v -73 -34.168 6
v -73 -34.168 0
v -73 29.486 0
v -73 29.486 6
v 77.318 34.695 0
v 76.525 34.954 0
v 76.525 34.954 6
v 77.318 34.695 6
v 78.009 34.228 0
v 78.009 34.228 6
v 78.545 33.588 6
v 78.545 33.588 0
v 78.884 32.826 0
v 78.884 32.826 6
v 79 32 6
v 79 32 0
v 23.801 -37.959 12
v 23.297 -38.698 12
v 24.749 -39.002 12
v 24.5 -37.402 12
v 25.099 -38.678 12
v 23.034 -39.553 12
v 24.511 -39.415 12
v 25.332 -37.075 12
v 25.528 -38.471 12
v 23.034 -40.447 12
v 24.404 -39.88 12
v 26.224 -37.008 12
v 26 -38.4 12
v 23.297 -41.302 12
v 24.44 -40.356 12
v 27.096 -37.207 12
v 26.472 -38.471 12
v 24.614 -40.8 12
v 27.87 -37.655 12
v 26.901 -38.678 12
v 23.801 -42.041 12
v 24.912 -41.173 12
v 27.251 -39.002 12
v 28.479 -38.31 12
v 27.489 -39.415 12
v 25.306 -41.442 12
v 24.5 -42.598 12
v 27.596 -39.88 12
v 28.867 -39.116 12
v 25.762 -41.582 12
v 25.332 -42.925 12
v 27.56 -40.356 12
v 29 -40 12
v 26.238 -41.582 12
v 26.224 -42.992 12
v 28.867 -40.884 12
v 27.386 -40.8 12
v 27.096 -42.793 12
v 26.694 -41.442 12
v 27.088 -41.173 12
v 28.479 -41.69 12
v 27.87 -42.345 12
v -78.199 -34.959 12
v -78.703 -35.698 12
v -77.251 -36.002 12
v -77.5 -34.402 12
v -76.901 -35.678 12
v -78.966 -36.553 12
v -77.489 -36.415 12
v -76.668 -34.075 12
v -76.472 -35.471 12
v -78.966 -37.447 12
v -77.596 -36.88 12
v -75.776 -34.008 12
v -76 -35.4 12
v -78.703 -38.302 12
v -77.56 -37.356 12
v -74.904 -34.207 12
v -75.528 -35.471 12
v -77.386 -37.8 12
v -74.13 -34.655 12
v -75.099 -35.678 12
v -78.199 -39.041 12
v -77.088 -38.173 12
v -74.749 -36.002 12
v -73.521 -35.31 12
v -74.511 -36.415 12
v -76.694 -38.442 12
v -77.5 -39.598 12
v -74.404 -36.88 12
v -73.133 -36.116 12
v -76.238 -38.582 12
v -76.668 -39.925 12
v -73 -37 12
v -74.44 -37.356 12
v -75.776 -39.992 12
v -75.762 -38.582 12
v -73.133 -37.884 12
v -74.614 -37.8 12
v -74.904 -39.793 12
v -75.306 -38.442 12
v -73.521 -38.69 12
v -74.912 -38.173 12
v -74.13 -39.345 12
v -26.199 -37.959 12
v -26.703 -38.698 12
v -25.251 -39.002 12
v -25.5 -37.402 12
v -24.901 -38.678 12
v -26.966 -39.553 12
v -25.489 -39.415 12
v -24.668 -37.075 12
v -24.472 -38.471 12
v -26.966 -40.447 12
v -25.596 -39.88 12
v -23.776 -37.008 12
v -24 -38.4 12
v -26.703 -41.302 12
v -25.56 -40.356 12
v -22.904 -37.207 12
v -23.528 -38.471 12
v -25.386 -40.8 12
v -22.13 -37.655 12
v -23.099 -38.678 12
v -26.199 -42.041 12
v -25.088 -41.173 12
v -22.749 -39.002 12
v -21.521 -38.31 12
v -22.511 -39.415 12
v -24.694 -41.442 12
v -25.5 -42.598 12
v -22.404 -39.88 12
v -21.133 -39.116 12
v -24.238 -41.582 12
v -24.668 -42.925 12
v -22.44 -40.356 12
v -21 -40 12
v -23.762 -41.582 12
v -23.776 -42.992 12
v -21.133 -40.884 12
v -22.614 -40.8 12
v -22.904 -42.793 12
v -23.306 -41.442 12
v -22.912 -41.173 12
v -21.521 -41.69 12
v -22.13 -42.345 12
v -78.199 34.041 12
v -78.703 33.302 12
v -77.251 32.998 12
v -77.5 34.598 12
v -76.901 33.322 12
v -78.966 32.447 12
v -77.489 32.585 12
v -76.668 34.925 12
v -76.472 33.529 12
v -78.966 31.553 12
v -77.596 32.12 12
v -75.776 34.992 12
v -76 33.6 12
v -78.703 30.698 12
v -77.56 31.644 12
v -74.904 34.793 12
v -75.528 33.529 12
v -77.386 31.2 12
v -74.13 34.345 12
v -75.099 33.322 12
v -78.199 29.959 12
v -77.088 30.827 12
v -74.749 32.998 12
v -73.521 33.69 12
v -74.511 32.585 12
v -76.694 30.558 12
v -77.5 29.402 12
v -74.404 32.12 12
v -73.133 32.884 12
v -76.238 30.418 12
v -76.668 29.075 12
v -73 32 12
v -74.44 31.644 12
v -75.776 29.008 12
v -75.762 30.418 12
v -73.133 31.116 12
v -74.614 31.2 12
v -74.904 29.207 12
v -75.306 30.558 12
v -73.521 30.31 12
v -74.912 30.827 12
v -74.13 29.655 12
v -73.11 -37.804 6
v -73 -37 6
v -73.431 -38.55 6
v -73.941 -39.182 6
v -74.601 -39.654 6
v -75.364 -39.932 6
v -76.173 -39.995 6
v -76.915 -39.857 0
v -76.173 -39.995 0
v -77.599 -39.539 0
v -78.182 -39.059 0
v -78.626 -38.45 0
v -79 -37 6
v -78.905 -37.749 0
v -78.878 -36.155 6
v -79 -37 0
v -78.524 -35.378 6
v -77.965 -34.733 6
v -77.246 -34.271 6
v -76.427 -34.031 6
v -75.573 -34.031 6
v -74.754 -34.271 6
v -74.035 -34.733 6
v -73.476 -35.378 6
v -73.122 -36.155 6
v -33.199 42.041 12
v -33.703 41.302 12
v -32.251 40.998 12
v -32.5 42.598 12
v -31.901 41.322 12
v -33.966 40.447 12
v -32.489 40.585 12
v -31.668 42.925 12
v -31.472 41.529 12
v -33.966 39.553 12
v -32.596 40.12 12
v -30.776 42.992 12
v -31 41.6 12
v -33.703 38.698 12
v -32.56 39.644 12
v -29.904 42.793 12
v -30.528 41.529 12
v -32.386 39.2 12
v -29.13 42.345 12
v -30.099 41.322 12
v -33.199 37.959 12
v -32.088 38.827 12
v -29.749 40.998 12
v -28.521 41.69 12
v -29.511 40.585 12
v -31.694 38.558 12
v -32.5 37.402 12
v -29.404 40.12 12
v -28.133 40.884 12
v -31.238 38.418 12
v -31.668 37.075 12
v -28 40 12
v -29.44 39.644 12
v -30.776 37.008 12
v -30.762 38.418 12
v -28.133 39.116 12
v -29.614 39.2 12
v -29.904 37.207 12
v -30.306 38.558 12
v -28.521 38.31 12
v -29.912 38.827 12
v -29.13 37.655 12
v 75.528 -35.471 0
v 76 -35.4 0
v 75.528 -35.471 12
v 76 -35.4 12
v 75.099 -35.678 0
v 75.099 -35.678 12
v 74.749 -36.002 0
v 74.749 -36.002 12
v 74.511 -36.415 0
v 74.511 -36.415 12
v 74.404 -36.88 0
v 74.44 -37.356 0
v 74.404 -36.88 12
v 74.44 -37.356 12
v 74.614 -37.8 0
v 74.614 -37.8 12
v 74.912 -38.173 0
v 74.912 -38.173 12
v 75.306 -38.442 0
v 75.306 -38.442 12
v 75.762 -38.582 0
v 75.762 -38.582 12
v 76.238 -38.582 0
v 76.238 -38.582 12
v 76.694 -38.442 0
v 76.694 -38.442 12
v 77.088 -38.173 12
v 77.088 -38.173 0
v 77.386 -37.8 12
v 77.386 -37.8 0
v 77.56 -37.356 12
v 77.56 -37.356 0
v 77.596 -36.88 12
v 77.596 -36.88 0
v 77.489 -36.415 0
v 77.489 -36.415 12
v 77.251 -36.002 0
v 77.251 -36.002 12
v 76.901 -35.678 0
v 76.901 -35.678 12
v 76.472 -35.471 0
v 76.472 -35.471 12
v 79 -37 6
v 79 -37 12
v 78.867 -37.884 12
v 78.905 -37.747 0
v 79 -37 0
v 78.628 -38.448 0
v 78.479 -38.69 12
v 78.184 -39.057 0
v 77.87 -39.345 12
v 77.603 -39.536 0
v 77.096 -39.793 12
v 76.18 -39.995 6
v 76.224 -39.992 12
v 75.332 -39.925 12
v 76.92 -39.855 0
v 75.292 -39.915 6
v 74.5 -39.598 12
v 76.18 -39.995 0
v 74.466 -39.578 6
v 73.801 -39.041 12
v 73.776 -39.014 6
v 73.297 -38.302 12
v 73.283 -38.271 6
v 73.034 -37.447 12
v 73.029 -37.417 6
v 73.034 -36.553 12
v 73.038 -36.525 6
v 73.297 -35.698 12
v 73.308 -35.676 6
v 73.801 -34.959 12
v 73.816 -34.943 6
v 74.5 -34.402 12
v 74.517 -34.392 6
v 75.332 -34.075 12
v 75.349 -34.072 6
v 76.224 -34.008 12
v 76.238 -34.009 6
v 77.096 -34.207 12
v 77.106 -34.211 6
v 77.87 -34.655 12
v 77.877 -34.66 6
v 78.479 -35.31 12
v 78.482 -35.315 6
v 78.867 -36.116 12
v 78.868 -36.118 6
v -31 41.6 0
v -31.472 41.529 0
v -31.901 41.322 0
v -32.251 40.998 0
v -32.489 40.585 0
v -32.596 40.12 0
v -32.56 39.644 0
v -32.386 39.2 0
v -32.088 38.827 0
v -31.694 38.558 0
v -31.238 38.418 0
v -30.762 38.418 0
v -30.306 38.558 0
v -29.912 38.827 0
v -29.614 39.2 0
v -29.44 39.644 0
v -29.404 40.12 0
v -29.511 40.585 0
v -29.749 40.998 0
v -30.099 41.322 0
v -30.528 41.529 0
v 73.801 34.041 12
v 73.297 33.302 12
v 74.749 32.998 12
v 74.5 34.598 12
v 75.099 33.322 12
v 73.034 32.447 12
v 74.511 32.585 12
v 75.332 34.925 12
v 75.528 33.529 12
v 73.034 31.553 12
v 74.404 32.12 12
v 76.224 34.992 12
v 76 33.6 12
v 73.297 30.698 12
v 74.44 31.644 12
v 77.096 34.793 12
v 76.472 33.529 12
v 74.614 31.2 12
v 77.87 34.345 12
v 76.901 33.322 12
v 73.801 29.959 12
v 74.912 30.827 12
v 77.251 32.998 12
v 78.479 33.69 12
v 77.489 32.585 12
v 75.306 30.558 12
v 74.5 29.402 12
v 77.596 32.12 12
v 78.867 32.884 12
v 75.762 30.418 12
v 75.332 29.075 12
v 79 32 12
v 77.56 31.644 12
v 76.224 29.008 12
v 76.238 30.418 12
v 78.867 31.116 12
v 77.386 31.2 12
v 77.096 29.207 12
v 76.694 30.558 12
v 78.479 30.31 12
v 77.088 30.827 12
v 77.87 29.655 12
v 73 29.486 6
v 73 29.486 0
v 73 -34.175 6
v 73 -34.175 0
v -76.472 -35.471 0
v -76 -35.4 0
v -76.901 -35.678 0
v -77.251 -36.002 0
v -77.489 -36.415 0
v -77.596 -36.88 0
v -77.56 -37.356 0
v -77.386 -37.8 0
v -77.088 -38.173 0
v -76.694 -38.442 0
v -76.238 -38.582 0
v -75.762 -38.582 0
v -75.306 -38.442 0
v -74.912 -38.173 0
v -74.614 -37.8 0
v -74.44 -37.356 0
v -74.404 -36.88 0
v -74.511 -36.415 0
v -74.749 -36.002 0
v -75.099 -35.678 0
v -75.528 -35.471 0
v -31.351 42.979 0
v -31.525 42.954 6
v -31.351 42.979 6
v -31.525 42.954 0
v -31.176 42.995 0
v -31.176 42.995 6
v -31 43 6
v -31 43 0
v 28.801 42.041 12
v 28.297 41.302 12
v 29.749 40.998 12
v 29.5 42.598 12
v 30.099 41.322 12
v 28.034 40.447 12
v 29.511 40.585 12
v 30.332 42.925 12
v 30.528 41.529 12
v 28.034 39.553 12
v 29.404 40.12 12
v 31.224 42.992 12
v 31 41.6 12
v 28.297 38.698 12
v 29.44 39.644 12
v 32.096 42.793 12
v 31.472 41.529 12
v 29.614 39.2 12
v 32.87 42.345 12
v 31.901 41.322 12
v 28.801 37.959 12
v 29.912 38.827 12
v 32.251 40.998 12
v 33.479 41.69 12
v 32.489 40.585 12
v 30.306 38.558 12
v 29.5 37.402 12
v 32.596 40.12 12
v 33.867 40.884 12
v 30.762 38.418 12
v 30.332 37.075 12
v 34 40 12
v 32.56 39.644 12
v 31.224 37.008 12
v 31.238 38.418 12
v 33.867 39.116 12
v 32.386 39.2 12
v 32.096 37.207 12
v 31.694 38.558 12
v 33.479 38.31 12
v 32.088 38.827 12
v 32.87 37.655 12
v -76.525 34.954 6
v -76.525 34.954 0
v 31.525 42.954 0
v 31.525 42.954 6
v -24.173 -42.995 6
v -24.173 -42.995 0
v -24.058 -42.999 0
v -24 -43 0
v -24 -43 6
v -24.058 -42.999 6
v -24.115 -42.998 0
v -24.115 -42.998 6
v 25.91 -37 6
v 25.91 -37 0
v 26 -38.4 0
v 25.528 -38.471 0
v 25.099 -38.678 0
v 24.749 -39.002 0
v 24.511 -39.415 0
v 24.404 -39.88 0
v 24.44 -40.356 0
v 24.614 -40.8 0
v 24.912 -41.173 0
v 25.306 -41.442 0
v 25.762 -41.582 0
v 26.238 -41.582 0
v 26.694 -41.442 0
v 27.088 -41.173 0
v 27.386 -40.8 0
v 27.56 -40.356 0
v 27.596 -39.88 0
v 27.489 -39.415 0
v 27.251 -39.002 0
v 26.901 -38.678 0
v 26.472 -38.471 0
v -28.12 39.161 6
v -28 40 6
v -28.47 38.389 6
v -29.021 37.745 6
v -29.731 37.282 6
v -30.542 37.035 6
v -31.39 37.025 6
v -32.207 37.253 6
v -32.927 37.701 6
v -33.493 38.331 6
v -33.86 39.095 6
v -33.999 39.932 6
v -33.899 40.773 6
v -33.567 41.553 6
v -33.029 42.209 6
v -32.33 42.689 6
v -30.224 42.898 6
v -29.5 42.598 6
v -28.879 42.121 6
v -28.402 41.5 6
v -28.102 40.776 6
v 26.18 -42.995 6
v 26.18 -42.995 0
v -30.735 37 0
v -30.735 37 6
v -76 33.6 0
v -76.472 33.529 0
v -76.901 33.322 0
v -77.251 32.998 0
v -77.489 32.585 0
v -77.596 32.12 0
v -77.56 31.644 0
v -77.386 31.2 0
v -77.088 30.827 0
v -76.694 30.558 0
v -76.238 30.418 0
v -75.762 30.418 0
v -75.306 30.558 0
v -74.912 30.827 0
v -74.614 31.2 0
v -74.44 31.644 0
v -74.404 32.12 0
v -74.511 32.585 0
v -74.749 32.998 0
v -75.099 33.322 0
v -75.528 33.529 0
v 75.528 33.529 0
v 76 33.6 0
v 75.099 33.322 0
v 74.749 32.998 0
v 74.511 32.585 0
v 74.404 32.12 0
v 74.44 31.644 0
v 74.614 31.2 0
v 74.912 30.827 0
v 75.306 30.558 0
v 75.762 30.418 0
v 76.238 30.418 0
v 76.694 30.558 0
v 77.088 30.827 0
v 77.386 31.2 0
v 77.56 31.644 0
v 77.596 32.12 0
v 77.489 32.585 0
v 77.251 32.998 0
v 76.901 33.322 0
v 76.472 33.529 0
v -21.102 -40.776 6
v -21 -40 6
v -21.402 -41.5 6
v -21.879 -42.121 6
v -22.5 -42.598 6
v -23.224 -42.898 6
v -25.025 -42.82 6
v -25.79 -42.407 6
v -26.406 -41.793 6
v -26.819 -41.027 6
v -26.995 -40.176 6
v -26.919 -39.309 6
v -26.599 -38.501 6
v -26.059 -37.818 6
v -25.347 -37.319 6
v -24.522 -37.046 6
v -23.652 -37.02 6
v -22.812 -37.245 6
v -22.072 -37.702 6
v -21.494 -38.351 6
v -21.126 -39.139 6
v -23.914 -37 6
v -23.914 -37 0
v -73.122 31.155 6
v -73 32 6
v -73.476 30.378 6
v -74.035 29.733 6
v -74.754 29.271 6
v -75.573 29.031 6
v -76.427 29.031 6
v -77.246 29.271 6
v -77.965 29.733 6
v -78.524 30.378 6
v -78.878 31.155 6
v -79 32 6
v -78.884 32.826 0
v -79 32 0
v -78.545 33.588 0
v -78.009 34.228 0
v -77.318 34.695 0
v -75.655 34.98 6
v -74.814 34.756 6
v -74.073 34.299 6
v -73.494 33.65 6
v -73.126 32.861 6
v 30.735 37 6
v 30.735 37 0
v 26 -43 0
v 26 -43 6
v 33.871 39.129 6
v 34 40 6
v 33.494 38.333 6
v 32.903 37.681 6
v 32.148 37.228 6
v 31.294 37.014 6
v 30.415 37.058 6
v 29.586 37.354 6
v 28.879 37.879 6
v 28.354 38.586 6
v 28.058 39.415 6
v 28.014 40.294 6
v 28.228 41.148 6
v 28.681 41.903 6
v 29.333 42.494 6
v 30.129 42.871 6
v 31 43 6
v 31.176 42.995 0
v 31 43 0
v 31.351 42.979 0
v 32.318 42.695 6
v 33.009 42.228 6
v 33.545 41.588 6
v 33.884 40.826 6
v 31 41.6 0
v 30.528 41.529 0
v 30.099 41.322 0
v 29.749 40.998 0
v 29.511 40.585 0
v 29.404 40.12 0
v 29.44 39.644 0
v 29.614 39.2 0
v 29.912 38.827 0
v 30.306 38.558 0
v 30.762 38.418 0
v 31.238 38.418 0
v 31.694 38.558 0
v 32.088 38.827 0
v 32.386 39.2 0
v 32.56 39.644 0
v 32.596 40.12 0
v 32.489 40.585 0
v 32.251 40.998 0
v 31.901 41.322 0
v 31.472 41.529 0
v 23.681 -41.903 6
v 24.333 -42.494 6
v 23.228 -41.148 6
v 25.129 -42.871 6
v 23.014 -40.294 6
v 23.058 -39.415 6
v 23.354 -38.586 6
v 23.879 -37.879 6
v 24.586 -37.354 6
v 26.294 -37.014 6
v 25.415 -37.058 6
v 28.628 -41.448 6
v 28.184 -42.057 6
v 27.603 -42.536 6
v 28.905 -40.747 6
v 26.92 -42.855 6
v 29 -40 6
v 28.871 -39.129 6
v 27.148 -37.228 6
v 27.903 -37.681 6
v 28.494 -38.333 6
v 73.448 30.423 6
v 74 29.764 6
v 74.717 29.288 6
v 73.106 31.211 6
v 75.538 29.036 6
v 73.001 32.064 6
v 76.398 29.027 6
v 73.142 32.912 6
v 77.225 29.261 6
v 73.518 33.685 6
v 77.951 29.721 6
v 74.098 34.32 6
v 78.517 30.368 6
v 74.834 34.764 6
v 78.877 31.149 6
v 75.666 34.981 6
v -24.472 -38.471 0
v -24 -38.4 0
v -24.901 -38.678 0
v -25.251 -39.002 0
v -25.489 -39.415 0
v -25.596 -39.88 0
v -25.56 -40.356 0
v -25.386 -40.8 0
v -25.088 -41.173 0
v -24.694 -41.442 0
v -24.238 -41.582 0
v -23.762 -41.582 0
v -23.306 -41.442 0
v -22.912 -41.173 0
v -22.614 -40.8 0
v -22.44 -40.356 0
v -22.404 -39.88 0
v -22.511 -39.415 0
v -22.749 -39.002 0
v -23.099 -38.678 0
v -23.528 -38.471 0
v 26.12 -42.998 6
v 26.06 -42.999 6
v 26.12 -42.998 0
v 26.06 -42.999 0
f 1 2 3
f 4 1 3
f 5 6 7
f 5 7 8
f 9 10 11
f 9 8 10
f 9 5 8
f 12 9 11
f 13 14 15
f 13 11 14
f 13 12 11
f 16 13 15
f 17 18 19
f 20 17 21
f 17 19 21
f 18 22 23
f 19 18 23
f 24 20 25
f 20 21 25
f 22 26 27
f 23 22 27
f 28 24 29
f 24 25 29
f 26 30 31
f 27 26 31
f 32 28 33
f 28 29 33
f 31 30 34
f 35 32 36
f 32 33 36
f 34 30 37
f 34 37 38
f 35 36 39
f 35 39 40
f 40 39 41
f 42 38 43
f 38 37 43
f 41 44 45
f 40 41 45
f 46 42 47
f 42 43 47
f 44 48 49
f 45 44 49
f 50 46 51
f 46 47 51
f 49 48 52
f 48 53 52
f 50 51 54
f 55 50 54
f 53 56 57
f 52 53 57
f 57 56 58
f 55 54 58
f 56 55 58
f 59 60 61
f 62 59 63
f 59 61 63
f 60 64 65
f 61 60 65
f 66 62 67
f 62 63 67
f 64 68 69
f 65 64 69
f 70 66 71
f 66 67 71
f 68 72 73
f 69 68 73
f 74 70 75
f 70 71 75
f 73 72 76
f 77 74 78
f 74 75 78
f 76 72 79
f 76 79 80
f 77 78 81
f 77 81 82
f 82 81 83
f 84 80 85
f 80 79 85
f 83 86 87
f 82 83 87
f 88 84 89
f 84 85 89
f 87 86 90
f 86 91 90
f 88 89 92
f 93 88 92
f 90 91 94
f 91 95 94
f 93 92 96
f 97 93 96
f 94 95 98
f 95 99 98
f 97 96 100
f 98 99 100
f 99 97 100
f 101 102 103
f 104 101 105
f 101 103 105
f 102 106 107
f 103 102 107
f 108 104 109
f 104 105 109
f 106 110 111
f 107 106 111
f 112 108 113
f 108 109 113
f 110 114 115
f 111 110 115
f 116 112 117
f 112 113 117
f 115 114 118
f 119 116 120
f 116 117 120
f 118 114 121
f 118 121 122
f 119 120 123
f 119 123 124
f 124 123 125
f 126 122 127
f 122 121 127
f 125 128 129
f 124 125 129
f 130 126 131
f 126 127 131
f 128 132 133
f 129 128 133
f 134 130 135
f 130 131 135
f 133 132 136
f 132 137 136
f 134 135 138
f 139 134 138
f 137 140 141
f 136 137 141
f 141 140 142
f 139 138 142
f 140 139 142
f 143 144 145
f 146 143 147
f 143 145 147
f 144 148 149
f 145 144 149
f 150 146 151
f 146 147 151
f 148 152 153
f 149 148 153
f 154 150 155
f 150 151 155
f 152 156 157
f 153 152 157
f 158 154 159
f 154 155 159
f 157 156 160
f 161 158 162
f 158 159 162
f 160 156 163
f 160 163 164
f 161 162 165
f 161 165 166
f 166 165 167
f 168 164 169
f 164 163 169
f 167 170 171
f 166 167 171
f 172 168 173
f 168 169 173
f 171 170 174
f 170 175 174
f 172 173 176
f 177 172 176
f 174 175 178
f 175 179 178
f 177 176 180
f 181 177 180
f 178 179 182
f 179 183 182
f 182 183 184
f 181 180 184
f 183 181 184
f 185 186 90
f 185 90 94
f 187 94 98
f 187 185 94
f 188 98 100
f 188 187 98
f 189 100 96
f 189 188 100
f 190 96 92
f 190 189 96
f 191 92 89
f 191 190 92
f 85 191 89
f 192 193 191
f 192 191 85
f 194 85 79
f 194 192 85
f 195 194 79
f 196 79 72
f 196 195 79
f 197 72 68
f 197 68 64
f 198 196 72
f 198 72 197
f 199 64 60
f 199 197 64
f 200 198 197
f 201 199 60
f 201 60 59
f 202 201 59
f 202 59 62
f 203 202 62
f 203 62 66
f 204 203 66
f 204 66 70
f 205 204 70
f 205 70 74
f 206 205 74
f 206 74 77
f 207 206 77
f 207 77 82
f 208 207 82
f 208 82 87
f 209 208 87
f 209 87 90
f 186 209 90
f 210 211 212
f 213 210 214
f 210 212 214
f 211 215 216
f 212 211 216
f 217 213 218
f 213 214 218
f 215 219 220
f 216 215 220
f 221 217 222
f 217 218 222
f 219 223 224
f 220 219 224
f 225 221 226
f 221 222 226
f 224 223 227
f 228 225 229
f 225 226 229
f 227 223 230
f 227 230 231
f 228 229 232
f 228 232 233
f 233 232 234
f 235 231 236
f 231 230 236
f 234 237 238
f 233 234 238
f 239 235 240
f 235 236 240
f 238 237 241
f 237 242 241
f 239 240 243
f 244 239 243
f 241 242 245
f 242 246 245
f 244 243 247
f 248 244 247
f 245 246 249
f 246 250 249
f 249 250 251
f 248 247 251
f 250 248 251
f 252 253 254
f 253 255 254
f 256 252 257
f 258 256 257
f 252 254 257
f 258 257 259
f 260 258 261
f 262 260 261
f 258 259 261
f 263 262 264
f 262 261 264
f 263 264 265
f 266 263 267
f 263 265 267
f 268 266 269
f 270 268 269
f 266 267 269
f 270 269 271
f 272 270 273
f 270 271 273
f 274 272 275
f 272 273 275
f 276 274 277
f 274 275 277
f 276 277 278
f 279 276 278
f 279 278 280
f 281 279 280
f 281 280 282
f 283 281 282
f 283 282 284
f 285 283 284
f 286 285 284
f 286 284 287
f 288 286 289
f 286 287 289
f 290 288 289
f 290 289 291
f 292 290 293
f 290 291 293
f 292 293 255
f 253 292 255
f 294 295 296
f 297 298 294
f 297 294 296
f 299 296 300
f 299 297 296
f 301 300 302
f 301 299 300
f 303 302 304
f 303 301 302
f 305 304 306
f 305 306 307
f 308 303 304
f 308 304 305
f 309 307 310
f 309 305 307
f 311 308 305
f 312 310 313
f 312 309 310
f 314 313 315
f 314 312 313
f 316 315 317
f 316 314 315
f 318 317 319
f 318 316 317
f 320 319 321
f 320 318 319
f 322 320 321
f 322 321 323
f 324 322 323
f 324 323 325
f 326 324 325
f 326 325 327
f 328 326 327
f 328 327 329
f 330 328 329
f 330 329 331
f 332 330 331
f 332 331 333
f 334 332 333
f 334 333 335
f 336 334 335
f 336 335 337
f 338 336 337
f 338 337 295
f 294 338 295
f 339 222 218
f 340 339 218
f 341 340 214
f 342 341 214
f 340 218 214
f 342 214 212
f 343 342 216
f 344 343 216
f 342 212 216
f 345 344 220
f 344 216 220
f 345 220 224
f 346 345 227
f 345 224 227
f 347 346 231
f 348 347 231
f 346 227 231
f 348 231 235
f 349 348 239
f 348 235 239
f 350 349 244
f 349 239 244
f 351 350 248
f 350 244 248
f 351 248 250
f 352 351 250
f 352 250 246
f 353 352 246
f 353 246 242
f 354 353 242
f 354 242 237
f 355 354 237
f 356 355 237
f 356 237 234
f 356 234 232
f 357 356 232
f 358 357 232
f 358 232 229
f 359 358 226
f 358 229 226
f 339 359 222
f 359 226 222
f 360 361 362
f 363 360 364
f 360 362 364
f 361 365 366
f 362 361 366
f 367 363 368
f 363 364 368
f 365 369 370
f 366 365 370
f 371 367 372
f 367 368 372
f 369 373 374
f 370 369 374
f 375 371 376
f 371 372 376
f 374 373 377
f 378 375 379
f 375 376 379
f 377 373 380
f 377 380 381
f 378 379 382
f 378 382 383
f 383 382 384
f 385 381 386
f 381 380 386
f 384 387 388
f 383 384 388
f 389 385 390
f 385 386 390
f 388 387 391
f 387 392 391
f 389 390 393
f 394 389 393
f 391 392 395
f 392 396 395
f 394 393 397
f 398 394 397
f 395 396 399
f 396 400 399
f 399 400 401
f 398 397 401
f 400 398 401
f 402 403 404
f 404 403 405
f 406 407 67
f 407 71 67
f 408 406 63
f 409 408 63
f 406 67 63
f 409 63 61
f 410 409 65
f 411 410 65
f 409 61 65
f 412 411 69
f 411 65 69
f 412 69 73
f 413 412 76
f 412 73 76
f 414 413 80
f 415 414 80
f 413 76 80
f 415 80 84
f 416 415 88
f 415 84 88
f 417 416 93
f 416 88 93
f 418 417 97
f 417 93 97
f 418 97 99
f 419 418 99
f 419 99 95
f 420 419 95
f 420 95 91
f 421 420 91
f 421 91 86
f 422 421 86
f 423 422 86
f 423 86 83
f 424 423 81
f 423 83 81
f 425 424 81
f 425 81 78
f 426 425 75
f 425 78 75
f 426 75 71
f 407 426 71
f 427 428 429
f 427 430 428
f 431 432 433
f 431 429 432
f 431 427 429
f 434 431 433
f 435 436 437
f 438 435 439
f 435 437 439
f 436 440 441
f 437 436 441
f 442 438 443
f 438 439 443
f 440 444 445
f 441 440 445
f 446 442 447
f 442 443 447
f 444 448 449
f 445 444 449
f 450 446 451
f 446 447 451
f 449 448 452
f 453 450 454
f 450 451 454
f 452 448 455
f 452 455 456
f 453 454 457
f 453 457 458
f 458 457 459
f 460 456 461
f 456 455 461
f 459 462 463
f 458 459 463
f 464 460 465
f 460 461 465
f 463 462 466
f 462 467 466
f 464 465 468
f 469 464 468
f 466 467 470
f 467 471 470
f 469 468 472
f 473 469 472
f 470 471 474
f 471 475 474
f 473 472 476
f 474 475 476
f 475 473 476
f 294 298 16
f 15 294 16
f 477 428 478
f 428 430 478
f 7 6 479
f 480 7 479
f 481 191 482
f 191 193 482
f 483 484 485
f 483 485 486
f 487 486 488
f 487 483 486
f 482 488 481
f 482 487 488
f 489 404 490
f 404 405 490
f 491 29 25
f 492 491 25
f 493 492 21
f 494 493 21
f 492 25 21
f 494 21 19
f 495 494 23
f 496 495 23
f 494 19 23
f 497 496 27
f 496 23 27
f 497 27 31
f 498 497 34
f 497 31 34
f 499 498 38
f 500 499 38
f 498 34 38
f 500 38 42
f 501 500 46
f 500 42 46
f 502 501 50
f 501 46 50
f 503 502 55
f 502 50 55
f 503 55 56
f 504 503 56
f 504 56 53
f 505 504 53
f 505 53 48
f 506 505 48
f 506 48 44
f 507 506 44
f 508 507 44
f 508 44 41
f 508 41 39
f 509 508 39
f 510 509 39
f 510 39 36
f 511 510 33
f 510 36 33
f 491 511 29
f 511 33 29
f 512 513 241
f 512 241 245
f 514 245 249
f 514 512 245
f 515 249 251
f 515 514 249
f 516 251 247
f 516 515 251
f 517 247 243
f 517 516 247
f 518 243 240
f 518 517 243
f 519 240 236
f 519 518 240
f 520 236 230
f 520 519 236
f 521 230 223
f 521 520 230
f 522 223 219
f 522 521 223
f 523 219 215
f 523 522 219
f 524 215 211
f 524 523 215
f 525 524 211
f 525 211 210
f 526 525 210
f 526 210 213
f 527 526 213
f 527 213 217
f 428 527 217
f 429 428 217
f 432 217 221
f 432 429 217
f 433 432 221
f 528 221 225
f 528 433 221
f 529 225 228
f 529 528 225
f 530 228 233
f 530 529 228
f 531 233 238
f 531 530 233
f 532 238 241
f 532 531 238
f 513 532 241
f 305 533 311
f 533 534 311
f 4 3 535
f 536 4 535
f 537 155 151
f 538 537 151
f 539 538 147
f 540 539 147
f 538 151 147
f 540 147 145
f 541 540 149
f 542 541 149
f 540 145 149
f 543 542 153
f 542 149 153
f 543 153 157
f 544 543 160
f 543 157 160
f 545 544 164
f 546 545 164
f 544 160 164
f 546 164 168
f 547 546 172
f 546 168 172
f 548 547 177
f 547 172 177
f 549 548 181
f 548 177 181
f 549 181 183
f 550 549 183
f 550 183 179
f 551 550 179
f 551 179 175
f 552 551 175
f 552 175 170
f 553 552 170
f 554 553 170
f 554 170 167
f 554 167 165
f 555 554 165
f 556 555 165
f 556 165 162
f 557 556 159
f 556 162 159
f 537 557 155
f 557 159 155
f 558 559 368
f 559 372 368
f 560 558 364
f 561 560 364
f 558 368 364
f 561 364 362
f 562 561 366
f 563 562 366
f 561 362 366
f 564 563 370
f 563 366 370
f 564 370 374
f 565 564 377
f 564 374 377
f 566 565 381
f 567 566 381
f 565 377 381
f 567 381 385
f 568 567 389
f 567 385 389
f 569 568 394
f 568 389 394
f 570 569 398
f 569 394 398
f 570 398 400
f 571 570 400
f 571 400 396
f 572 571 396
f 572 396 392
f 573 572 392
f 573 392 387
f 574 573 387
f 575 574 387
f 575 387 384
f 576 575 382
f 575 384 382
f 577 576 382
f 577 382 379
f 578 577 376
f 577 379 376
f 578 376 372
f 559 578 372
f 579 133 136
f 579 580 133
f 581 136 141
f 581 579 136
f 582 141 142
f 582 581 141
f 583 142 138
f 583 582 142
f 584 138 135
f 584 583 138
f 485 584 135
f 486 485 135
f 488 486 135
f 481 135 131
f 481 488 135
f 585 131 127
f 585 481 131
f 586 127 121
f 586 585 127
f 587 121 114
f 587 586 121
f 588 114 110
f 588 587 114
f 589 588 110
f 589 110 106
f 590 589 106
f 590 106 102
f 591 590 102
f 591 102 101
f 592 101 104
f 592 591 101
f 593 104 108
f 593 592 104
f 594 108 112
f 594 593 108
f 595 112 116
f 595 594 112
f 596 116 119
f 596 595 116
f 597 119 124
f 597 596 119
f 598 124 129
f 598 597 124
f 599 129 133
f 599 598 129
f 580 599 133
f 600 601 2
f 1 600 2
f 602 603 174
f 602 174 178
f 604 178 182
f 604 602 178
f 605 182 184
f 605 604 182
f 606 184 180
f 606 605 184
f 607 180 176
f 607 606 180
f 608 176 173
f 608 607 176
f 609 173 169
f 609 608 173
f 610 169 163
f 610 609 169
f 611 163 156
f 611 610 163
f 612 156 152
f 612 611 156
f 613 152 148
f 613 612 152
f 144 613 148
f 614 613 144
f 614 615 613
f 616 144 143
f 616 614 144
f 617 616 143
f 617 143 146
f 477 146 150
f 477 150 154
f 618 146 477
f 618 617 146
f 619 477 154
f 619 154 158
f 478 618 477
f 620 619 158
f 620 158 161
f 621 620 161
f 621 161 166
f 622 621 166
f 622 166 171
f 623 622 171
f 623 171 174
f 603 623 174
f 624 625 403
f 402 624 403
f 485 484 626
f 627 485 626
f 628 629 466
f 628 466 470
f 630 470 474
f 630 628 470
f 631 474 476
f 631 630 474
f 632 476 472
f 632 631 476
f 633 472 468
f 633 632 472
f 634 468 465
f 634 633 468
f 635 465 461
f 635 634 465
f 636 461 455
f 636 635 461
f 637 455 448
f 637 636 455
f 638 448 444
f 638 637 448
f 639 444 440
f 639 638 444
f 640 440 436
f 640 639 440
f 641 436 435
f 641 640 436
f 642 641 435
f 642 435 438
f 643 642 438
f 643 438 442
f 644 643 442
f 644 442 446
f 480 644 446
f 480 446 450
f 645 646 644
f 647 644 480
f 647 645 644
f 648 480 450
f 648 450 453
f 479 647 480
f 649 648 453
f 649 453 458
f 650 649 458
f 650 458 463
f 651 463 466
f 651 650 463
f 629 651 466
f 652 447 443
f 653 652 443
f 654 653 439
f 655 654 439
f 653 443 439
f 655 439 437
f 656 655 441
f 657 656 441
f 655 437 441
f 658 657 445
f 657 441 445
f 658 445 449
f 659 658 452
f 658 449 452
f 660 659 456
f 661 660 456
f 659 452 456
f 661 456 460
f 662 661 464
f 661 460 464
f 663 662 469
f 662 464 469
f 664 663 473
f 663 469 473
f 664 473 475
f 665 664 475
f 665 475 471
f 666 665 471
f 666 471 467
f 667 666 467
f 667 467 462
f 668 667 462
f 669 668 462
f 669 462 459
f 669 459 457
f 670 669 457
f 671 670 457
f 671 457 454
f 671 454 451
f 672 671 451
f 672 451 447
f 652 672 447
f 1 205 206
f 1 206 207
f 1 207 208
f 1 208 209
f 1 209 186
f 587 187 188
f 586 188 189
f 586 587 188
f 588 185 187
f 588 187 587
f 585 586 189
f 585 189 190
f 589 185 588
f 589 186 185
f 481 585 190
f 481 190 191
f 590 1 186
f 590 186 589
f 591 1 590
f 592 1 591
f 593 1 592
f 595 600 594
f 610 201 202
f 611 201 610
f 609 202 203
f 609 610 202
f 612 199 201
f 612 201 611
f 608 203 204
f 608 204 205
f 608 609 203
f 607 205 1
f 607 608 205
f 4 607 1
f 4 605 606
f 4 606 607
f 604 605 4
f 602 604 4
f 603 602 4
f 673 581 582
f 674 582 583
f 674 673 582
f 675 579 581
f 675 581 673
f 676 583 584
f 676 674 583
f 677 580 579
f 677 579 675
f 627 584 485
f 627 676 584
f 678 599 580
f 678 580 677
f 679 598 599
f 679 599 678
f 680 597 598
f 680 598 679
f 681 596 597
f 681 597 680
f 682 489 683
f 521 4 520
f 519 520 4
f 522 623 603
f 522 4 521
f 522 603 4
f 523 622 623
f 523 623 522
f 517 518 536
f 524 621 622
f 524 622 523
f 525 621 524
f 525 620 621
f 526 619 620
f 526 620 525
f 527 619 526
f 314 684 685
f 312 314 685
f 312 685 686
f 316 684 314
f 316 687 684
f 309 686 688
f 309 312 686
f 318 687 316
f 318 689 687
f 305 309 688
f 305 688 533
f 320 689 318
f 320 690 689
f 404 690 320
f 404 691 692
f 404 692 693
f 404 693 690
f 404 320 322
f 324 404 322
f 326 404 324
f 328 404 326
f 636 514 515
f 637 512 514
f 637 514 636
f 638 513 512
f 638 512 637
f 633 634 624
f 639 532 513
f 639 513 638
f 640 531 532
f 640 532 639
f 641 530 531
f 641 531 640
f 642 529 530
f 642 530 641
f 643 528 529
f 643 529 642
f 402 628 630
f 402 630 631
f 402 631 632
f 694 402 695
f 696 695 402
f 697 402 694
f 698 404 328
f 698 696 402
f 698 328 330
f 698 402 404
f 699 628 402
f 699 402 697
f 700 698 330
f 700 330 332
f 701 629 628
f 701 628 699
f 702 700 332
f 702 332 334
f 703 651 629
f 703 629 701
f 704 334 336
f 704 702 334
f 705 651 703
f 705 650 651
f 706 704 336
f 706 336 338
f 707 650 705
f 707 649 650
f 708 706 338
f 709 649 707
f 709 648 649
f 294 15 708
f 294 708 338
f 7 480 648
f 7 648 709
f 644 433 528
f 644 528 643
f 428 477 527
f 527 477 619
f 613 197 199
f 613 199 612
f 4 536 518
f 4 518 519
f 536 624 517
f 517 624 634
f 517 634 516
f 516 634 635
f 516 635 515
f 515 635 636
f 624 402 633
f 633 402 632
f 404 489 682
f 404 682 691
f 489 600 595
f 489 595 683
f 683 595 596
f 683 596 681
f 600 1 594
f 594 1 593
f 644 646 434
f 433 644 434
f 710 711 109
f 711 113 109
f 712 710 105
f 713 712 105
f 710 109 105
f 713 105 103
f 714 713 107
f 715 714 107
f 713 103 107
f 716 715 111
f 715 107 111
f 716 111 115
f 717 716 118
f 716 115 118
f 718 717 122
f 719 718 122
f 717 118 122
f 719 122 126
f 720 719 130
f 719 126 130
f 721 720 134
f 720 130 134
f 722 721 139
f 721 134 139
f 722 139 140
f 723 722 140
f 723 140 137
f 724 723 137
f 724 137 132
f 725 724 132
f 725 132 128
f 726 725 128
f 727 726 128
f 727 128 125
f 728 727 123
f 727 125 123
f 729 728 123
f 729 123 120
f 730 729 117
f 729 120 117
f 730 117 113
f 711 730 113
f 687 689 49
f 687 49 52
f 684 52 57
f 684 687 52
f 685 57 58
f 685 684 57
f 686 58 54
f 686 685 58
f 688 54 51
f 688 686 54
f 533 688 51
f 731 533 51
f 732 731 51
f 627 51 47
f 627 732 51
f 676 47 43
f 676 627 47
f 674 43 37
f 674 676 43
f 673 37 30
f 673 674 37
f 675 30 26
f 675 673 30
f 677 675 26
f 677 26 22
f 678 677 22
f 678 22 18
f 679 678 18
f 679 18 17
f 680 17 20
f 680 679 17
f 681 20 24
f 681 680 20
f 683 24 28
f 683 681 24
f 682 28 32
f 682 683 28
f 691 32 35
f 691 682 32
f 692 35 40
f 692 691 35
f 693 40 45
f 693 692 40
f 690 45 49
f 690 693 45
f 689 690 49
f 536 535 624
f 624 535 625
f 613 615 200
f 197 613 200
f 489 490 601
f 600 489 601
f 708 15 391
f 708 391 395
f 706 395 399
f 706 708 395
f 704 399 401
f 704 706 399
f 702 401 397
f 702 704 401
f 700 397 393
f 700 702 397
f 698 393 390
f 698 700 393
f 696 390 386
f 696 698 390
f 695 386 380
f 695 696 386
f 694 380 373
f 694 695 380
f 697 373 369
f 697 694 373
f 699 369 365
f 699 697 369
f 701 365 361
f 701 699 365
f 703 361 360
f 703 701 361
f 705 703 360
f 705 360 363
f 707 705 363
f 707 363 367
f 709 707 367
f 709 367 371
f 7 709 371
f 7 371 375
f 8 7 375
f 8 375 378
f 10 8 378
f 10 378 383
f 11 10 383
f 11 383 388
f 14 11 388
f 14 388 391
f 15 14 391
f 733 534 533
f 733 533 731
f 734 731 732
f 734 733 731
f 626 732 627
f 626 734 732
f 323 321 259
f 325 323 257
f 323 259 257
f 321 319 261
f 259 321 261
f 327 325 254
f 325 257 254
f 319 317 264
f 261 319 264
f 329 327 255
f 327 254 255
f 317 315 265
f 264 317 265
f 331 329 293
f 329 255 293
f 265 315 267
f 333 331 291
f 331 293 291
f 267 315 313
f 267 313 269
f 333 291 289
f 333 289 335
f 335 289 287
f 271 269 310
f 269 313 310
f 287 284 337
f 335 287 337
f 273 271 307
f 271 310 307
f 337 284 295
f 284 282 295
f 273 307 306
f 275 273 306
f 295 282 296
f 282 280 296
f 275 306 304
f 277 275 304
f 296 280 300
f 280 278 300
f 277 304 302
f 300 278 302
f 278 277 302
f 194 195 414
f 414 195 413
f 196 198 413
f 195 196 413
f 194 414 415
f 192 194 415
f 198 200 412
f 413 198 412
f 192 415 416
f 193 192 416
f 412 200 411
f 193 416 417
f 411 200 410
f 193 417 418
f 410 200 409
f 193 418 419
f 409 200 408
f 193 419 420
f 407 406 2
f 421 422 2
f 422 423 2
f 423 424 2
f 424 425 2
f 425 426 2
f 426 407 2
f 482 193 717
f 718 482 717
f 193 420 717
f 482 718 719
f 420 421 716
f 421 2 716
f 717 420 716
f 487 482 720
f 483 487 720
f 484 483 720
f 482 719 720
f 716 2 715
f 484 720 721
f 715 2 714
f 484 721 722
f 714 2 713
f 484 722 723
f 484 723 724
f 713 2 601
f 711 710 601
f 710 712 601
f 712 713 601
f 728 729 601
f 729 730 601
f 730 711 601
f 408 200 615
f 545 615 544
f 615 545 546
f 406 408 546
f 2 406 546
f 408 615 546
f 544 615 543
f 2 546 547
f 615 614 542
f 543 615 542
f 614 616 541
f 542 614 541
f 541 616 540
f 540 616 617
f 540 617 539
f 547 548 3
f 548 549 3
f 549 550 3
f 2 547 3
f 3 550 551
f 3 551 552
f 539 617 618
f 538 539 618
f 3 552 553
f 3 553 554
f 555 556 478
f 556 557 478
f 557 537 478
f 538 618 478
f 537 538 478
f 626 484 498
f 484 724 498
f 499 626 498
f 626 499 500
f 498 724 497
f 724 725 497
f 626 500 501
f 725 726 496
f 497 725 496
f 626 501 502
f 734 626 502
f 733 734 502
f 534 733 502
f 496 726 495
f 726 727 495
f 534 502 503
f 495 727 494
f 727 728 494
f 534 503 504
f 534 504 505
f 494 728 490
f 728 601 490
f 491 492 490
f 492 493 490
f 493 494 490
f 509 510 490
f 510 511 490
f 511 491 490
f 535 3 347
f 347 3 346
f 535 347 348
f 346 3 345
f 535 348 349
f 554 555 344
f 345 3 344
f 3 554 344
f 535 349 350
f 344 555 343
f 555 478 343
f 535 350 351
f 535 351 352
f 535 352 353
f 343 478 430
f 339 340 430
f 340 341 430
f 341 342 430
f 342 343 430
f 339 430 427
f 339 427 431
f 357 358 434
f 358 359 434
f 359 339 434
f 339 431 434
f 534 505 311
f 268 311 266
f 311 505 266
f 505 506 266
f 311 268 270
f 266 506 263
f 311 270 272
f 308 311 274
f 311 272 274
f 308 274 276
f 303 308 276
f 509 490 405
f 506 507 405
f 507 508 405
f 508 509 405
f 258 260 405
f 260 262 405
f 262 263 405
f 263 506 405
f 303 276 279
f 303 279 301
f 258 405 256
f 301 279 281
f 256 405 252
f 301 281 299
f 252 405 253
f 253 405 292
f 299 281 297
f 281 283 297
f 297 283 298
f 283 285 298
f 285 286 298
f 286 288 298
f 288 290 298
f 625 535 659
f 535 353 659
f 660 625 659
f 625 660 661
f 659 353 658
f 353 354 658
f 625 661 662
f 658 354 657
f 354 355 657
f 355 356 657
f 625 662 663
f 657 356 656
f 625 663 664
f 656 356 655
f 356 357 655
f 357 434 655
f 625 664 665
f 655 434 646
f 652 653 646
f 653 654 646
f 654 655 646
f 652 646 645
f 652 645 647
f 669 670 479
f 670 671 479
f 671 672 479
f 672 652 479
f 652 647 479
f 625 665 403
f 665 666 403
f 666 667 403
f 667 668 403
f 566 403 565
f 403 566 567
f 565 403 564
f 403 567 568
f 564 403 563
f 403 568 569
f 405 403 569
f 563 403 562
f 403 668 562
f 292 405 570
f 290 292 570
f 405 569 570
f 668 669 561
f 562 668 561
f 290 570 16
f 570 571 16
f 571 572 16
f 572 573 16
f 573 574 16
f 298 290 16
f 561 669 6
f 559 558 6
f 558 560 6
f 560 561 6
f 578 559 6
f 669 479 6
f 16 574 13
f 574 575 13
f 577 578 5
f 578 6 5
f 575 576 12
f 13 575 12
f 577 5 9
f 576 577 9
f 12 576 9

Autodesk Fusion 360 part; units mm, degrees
sketch "Sketch1" plane through (0, 0, 0) normal (0, 0, 1) x (1, 0, 0)
  circle A0 centre (-76, 32) radius 1.6
  circle A1 centre (-31, 40) radius 1.6
  circle A2 centre (31, 40) radius 1.6
  circle A3 centre (76, 32) radius 1.6
  circle A4 centre (-76, -37) radius 1.6
  circle A5 centre (-24, -40) radius 1.6
  circle A6 centre (26, -40) radius 1.6
  circle A7 centre (76, -37) radius 1.6
  line L0 (-80, 44) -> (80, 44)
  line L1 (80, 44) -> (80, -44)
  line L2 (80, -44) -> (-80, -44)
  line L3 (-80, -44) -> (-80, 44)
  line L4 (80, 44) -> (-80, -44) construction
  dimension "d1" = 3.2
  dimension "d2" = 69
  dimension "d3" = 152
  dimension "d4" = 50
  dimension "d5" = 62
  dimension "d6" = 7
  dimension "d7" = 160
  dimension "d8" = 4
  dimension "d9" = 88
  dimension "d10" = 4
  dimension "d11" = 4
  dimension "d13" = 49
  dimension "d21" = 56
sketch "Sketch2" plane through (0, 0, 0) normal (0, 0, 1) x (1, 0, 0)
  circle A0 centre (-76, 32) radius 1.6 construction
  circle A1 centre (-31, 40) radius 1.6 construction
  circle A2 centre (31, 40) radius 1.6 construction
  circle A3 centre (76, 32) radius 1.6 construction
  circle A4 centre (76, -37) radius 1.6 construction
  circle A5 centre (26, -40) radius 1.6 construction
  circle A6 centre (-24, -40) radius 1.6 construction
  circle A7 centre (-76, -37) radius 1.6 construction
  circle A8 centre (-76, 32) radius 3 construction
  circle A9 centre (-31, 40) radius 3 construction
  circle A10 centre (31, 40) radius 3 construction
  circle A11 centre (76, 32) radius 3 construction
  circle A12 centre (76, -37) radius 3 construction
  circle A13 centre (26, -40) radius 3 construction
  circle A14 centre (-24, -40) radius 3 construction
  circle A15 centre (-76, -37) radius 3 construction
  line L0 (-79, 32) -> (-79, -37)
  arc A16 (-79, -37) -> (-73, -37) centre (-76, -37) ccw
  line L1 (-73, -37) -> (-73, 32)
  arc A17 (-73, 32) -> (-79, 32) centre (-76, 32) ccw
  line L2 (-76, 32) -> (-76, -37) construction
  line L3 (-76.1728, -39.995) -> (-24.1728, -42.995)
  arc A18 (-24.1728, -42.995) -> (-23.8272, -37.005) centre (-24, -40) ccw
  line L4 (-23.8272, -37.005) -> (-75.8272, -34.005)
  arc A19 (-75.8272, -34.005) -> (-76.1728, -39.995) centre (-76, -37) ccw
  line L5 (-76, -37) -> (-24, -40) construction
  line L6 (-75.4749, 29.0463) -> (-30.4749, 37.0463)
  arc A20 (-30.4749, 37.0463) -> (-31.5251, 42.9537) centre (-31, 40) ccw
  line L7 (-31.5251, 42.9537) -> (-76.5251, 34.9537)
  arc A21 (-76.5251, 34.9537) -> (-75.4749, 29.0463) centre (-76, 32) ccw
  line L8 (-76, 32) -> (-31, 40) construction
  line L9 (-31, 37) -> (31, 37)
  arc A22 (31, 37) -> (31, 43) centre (31, 40) ccw
  line L10 (31, 43) -> (-31, 43)
  arc A23 (-31, 43) -> (-31, 37) centre (-31, 40) ccw
  line L11 (-31, 40) -> (31, 40) construction
  line L12 (30.4749, 37.0463) -> (75.4749, 29.0463)
  arc A24 (75.4749, 29.0463) -> (76.5251, 34.9537) centre (76, 32) ccw
  line L13 (76.5251, 34.9537) -> (31.5251, 42.9537)
  arc A25 (31.5251, 42.9537) -> (30.4749, 37.0463) centre (31, 40) ccw
  line L14 (31, 40) -> (76, 32) construction
  line L15 (73, 32) -> (73, -37)
  arc A26 (73, -37) -> (79, -37) centre (76, -37) ccw
  line L16 (79, -37) -> (79, 32)
  arc A27 (79, 32) -> (73, 32) centre (76, 32) ccw
  line L17 (76, 32) -> (76, -37) construction
  line L18 (75.8203, -34.0054) -> (25.8203, -37.0054)
  arc A28 (25.8203, -37.0054) -> (26.1797, -42.9946) centre (26, -40) ccw
  line L19 (26.1797, -42.9946) -> (76.1797, -39.9946)
  arc A29 (76.1797, -39.9946) -> (75.8203, -34.0054) centre (76, -37) ccw
  line L20 (76, -37) -> (26, -40) construction
  line L21 (26, -37) -> (-24, -37)
  arc A30 (-24, -37) -> (-24, -43) centre (-24, -40) ccw
  line L22 (-24, -43) -> (26, -43)
  arc A31 (26, -43) -> (26, -37) centre (26, -40) ccw
  line L23 (26, -40) -> (-24, -40) construction
  dimension "d14" = 6
extrude "Extrude1" add sketch "Sketch2" along normal blind 6 contours L0 L1 L4 A19 L6 A21 | L1 A17 L6 A21 | A16 L1 L4 A19 | L1 A17 L6 L7 L9 A23 | A16 L1 L3 L4 L21 A30 | L6 A20 L9 A23 | A18 L4 L21 A30 | L6 A20 L9 L10 L12 A25 | A18 L4 L18 A28 L21 L22 | L9 A22 L12 A25 | L9 A22 L12 L13 L15 A27 | L18 A28 L21 A31 | L15 A26 L18 L19 L21 A31 | L12 A24 L15 A27 | L12 A24 L15 L16 L18 A29 | L15 A26 L18 A29
sketch "Sketch3" plane through (0, 0, 0) normal (0, 0, -1) x (1, 0, 0)
  circle A0 centre (-76, 37) radius 3
  circle A1 centre (-24, 40) radius 3
  circle A2 centre (26, 40) radius 3
  circle A3 centre (76, 37) radius 3
  circle A4 centre (76, -32) radius 3
  circle A5 centre (31, -40) radius 3
  circle A6 centre (-31, -40) radius 3
  circle A7 centre (-76, -32) radius 3
extrude "Extrude2" add sketch "Sketch3" against normal blind 12
hole "Hole1" at (76, 32, 0) at (31, 40, 0) at (-31, 40, 0) at (-76, 32, 0) at (-76, -37, 0) at (-24, -40, 0) at (26, -40, 0) at (76, -37, 0) direction (0, 0, 1) diameter 3.2 end through all
equation "d6 = 5.4 mm + ( ( 3.2 / 2 ) * 1 mm )"
equation "d8 = 2.4 mm + ( ( 3.2 / 2 ) * 1 mm )"
equation "d10 = 2.4 mm + ( ( 3.2 / 2 ) * 1 mm )"
equation "d11 = 2.4 mm + ( ( 3.2 / 2 ) * 1 mm )"
equation "d13 = 47.4 mm + ( ( 3.2 / 2 ) * 1 mm )"
equation "d21 = 54.4 mm + ( ( 3.2 / 2 ) * 1 mm )"
